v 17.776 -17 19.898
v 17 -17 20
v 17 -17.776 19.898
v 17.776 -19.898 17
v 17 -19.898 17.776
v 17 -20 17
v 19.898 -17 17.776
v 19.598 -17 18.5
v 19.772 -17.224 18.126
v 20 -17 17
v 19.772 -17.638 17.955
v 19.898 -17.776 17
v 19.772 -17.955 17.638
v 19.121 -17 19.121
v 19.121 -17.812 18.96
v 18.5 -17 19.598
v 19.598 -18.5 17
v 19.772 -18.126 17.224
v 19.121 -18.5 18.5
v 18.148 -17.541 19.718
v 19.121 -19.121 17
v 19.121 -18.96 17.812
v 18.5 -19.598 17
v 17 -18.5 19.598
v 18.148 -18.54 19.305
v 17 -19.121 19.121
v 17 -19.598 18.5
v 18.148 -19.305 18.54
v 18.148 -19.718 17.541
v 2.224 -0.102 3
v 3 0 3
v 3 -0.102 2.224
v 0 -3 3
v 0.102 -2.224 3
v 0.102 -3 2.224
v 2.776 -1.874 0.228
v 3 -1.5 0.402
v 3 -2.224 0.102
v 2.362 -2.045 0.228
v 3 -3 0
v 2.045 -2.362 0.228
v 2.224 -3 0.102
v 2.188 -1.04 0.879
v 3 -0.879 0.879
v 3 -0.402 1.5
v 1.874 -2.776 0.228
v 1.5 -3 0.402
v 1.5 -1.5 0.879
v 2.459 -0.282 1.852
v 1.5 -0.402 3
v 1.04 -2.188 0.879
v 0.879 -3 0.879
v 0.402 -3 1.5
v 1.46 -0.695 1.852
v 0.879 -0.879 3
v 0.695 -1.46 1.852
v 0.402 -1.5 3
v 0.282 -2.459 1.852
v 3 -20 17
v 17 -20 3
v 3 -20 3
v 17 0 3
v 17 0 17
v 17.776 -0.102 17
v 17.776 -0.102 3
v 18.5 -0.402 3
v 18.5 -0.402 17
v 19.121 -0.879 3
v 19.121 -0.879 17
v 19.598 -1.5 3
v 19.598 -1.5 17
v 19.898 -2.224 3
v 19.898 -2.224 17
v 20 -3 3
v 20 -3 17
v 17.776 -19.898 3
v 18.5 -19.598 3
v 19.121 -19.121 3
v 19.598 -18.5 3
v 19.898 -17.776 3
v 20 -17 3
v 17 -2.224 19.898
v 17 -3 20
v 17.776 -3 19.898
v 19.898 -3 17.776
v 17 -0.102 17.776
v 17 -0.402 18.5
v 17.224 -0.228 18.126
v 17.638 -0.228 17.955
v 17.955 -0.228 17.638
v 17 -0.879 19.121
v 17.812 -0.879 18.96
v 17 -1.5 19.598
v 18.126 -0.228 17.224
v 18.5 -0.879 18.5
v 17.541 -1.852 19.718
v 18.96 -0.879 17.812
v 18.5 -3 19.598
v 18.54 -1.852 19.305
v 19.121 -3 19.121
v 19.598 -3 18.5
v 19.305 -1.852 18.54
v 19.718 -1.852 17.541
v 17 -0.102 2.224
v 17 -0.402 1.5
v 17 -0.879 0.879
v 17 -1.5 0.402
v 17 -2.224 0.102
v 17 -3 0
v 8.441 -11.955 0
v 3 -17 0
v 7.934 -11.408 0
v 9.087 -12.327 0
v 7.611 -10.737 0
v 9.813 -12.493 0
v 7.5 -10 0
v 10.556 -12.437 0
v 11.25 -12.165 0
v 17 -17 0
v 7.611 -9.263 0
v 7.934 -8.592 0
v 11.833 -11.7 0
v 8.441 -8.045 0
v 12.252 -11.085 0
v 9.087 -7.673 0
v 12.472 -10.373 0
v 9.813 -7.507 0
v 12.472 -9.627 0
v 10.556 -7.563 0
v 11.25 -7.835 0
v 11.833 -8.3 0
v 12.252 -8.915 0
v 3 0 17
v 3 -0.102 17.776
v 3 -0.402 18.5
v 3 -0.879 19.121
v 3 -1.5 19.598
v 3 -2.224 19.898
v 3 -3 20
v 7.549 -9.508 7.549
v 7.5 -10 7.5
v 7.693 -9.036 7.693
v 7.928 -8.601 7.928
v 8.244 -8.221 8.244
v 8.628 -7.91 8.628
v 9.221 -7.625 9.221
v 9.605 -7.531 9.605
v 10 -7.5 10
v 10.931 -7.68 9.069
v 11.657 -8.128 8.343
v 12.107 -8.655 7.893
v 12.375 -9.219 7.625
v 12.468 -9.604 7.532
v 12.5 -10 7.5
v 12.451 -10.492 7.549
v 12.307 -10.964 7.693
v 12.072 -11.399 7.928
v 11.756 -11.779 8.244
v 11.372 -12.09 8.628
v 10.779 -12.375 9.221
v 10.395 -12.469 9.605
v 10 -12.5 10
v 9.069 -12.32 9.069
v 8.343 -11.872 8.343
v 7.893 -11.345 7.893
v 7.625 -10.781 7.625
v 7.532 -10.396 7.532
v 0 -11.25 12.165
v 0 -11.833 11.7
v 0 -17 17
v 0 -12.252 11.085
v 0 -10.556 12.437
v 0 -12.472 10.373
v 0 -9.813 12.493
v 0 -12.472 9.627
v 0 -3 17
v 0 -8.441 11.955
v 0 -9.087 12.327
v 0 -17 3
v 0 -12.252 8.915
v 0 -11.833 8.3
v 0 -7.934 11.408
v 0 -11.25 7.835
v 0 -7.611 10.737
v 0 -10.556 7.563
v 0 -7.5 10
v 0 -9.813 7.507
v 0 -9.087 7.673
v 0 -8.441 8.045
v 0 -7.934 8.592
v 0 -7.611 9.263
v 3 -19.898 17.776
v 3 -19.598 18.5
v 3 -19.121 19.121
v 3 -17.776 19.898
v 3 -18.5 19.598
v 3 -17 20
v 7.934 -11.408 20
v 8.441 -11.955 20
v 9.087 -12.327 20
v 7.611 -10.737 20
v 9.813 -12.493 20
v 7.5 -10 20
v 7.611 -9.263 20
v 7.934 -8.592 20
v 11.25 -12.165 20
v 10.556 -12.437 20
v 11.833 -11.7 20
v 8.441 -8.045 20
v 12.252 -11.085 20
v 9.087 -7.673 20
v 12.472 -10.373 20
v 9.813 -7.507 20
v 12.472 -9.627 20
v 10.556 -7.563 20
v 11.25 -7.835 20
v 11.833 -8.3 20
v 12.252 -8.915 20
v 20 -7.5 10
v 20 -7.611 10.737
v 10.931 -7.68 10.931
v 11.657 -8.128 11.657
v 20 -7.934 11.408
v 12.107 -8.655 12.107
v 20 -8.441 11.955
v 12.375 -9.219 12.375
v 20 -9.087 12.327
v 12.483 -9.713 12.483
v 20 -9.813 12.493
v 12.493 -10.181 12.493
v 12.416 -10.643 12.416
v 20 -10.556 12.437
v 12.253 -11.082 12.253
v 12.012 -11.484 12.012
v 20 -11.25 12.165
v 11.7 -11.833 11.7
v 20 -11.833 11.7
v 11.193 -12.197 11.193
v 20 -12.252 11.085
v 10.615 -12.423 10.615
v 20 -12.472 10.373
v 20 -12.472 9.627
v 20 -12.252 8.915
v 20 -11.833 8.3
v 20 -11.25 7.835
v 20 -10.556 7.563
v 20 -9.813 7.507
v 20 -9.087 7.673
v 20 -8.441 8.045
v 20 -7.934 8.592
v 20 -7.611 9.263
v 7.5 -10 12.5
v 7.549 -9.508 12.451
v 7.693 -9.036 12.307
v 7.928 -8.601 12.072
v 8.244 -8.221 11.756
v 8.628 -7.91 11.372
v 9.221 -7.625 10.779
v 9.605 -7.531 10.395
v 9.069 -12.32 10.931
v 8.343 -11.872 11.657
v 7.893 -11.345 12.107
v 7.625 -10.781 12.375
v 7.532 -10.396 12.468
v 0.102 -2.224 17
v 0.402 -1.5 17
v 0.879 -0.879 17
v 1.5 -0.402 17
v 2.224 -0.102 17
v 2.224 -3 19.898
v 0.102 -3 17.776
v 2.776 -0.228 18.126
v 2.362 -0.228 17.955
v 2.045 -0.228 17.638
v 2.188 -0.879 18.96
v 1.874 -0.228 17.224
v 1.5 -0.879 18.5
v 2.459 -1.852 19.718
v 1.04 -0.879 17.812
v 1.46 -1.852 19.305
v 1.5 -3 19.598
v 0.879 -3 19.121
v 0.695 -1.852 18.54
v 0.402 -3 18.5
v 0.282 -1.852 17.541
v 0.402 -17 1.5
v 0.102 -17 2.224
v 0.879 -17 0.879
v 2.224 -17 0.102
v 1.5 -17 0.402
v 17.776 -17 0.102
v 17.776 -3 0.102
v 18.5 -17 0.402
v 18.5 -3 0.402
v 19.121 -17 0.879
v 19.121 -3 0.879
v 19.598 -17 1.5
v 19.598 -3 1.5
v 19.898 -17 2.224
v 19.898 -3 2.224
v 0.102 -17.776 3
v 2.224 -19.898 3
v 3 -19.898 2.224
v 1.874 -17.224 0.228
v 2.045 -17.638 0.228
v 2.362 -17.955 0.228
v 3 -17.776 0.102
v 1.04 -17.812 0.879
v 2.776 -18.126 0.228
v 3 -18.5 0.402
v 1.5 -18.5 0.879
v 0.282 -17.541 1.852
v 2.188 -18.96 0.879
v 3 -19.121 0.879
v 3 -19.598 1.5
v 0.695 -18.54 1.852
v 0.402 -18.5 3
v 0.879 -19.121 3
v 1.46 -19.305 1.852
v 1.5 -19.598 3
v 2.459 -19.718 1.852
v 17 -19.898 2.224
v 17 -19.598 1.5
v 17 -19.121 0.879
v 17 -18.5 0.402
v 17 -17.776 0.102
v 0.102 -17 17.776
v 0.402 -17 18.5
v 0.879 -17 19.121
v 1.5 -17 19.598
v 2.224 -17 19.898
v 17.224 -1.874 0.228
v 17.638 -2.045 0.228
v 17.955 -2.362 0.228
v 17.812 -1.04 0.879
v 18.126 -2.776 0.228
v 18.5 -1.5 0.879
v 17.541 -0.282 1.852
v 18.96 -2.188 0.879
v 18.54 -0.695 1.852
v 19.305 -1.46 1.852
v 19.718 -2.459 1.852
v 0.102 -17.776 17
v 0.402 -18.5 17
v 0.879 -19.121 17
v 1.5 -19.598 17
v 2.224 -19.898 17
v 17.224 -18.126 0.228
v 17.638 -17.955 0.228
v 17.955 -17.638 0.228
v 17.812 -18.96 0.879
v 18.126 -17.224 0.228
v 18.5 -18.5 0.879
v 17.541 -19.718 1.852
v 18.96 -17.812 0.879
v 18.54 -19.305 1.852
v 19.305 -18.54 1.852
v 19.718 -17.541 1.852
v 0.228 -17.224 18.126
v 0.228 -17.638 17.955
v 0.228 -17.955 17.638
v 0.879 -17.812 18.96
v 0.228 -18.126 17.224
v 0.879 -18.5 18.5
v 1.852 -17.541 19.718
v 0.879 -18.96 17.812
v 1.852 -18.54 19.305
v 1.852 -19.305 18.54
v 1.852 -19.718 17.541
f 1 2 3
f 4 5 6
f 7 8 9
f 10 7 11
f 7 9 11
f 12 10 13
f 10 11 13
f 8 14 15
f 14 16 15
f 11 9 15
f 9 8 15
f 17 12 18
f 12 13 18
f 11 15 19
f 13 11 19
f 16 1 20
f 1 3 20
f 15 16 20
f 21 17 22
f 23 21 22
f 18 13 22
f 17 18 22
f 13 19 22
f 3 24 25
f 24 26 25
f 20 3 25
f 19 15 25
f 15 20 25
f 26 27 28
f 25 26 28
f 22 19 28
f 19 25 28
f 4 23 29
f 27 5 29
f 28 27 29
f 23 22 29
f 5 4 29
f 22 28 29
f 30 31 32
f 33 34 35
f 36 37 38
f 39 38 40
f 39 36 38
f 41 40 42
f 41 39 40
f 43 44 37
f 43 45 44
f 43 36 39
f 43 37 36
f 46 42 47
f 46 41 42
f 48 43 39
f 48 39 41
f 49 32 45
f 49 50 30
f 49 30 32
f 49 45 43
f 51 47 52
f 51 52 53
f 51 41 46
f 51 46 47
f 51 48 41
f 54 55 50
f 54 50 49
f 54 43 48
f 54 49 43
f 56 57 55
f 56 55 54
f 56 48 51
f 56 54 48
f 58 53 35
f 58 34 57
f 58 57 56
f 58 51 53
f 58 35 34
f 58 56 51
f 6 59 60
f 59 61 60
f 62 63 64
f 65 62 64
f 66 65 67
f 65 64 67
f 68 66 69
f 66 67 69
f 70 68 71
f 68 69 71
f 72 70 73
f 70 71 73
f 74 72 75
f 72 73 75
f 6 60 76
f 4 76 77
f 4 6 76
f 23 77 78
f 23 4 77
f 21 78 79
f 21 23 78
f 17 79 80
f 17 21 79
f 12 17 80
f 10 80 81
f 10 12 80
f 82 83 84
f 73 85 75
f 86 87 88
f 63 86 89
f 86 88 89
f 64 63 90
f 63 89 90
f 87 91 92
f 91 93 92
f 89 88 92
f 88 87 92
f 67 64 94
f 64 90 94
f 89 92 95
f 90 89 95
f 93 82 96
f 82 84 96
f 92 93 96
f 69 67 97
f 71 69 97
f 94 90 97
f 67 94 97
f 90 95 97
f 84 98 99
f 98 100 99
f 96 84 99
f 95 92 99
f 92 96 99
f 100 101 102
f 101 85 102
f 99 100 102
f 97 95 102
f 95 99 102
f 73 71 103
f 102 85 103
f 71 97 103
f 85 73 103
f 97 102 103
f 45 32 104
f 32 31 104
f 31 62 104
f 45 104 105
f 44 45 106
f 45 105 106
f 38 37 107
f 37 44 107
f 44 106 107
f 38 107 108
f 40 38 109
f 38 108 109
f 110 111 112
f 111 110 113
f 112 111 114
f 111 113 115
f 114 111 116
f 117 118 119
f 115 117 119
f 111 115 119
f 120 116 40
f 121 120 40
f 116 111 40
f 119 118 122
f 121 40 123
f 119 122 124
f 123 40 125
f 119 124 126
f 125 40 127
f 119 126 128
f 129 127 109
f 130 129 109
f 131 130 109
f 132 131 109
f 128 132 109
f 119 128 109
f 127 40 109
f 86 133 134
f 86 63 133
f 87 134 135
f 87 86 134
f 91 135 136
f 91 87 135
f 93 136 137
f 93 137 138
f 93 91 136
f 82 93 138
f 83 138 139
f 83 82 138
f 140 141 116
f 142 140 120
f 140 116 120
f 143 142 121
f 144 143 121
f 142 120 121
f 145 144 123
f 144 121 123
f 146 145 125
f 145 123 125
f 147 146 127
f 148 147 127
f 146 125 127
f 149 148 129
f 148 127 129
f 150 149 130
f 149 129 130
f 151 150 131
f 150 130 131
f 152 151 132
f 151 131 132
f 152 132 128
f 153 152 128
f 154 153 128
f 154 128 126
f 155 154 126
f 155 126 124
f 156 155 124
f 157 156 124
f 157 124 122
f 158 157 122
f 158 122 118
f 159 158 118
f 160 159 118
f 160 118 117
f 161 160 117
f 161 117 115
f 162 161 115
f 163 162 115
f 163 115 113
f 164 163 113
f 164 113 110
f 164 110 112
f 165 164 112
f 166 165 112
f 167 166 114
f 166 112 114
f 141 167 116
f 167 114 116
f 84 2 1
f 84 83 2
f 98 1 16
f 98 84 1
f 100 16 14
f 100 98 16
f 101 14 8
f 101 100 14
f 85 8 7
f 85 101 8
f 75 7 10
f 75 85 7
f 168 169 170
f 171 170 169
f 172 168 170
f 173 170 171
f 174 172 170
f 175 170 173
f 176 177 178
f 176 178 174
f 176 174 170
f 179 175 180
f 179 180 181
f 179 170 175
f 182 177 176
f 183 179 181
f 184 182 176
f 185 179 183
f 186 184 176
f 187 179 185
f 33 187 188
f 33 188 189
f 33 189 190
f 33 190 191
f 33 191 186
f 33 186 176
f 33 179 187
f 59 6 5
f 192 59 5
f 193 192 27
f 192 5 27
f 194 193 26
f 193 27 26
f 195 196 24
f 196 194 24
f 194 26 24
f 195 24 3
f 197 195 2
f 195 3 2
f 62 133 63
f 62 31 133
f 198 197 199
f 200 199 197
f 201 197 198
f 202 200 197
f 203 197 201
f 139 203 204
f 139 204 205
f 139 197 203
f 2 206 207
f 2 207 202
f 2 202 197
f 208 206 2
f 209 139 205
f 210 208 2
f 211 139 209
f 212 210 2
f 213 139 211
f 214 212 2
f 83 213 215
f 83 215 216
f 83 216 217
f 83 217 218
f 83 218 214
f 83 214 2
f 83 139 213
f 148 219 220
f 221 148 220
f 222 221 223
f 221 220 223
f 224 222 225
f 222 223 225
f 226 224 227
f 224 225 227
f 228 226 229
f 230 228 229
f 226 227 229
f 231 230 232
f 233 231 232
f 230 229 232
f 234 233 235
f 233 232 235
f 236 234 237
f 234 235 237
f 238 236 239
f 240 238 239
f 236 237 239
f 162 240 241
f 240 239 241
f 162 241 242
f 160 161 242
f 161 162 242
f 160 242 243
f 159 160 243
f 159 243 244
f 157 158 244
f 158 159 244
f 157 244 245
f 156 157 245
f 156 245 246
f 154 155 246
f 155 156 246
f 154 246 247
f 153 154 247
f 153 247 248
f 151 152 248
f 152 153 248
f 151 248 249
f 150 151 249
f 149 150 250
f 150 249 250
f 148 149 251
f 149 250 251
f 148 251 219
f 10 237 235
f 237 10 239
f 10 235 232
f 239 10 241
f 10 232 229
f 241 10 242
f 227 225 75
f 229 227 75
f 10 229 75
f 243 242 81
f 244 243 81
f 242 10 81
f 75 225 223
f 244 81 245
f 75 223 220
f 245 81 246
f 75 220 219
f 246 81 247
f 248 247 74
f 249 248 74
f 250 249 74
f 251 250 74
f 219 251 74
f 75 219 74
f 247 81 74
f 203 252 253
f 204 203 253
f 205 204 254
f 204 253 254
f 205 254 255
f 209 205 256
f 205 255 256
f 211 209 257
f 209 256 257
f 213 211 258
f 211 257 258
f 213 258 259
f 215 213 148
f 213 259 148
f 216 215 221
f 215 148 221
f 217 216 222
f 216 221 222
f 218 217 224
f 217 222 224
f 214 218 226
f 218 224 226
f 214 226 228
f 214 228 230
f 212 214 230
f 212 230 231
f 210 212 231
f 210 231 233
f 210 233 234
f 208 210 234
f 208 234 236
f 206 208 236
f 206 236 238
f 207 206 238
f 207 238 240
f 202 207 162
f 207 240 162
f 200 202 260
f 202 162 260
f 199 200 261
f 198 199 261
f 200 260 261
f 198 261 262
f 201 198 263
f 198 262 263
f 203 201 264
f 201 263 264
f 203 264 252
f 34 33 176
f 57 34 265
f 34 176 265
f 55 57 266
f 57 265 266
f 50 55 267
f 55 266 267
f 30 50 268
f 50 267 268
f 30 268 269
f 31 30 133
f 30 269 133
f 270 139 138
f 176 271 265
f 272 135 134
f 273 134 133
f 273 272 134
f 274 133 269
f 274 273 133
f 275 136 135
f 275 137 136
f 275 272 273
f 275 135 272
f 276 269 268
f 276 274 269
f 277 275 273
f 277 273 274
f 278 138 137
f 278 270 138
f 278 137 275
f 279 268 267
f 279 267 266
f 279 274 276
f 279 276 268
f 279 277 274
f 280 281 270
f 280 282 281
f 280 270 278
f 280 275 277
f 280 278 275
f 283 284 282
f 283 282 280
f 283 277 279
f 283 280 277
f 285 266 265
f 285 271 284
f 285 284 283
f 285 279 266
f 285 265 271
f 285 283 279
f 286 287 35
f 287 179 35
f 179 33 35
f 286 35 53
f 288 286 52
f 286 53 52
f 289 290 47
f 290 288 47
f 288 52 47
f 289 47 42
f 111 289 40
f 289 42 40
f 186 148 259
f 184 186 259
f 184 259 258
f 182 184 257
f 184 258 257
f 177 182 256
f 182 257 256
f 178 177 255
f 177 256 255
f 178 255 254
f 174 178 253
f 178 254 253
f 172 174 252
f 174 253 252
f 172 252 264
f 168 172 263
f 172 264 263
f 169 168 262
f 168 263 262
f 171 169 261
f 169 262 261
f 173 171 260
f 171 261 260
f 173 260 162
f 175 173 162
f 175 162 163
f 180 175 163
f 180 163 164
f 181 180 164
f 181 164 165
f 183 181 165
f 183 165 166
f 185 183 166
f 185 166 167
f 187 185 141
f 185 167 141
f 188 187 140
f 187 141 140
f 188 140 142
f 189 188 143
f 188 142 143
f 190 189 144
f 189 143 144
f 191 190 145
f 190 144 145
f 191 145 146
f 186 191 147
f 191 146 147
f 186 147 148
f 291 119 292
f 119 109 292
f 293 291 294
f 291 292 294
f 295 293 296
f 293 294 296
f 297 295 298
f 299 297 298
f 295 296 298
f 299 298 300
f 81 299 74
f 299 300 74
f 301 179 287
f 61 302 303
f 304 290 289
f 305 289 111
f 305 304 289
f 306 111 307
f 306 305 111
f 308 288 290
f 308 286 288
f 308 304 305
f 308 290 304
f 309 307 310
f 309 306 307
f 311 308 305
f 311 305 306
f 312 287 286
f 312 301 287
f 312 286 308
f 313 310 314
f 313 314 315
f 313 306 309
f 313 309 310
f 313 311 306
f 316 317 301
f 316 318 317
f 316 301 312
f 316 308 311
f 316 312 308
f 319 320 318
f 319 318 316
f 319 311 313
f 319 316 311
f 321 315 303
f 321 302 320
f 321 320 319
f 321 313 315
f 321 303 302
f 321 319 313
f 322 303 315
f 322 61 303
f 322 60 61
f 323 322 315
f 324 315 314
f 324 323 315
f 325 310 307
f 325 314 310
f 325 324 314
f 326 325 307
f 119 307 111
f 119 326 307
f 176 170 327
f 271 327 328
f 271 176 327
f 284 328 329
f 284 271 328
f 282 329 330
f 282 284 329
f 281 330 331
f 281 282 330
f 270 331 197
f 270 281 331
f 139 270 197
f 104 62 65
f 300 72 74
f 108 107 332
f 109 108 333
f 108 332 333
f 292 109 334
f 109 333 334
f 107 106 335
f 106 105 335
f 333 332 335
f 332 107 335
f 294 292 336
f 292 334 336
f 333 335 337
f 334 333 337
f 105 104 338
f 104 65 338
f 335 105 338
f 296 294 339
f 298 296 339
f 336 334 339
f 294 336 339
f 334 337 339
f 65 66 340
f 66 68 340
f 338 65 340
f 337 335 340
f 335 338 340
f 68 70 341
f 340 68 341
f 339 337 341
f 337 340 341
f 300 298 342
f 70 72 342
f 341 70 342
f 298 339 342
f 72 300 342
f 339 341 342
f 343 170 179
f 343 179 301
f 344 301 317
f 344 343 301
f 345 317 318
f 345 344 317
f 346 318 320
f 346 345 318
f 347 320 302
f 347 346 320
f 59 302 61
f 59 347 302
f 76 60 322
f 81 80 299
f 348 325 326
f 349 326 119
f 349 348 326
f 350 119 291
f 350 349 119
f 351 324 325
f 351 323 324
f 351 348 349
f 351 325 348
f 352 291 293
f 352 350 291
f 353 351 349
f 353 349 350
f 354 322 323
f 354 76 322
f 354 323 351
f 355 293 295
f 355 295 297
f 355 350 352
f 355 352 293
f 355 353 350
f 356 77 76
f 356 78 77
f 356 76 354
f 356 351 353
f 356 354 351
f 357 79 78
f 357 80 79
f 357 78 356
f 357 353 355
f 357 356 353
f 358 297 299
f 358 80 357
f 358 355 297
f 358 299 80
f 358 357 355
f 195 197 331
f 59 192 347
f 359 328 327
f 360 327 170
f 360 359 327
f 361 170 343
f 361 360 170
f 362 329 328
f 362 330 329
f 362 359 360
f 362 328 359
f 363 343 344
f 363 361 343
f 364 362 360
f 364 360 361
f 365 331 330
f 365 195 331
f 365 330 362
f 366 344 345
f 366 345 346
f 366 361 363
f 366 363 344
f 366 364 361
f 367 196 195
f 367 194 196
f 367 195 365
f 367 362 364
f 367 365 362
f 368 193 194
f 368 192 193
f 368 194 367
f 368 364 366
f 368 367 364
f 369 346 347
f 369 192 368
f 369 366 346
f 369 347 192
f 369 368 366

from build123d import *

# Parameters (mm, degrees)
F0_W     = 20
F0_H     = 20
F1_DEPTH = 20
F3_D     = 5
F4_R     = 3
F6_D     = 5


with BuildPart() as f1:
    # F0 (on Top) → F1 (new body)
    with BuildSketch(Plane.XY):
        with Locations((10, -10)):
            Rectangle(F0_W, F0_H)
    extrude(amount=F1_DEPTH)

    # F3 (through all)
    with Locations(Plane.XY.offset(20)):
        with Locations((10, -10)):
            Hole(F3_D / 2)

    # F4
    f4_edges = [f1.edges().sort_by_distance(p)[0] for p in [
        (10, -20, 20),
        (0, -10, 20),
        (20, -10, 20),
        (10, 0, 20),
        (0, -20, 10),
        (20, -20, 10),
        (20, 0, 10),
        (0, 0, 10),
        (10, 0, 0),
        (0, -10, 0),
        (10, -20, 0),
        (20, -10, 0),
    ]]
    fillet(f4_edges, radius=F4_R)

    # F6 (through all)
    with Locations(Plane(origin=(0, 0, 0), x_dir=(0, -1, 0), z_dir=(-1, 0, 0))):
        with Locations((10, 10)):
            Hole(F6_D / 2)


solid = f1.part
